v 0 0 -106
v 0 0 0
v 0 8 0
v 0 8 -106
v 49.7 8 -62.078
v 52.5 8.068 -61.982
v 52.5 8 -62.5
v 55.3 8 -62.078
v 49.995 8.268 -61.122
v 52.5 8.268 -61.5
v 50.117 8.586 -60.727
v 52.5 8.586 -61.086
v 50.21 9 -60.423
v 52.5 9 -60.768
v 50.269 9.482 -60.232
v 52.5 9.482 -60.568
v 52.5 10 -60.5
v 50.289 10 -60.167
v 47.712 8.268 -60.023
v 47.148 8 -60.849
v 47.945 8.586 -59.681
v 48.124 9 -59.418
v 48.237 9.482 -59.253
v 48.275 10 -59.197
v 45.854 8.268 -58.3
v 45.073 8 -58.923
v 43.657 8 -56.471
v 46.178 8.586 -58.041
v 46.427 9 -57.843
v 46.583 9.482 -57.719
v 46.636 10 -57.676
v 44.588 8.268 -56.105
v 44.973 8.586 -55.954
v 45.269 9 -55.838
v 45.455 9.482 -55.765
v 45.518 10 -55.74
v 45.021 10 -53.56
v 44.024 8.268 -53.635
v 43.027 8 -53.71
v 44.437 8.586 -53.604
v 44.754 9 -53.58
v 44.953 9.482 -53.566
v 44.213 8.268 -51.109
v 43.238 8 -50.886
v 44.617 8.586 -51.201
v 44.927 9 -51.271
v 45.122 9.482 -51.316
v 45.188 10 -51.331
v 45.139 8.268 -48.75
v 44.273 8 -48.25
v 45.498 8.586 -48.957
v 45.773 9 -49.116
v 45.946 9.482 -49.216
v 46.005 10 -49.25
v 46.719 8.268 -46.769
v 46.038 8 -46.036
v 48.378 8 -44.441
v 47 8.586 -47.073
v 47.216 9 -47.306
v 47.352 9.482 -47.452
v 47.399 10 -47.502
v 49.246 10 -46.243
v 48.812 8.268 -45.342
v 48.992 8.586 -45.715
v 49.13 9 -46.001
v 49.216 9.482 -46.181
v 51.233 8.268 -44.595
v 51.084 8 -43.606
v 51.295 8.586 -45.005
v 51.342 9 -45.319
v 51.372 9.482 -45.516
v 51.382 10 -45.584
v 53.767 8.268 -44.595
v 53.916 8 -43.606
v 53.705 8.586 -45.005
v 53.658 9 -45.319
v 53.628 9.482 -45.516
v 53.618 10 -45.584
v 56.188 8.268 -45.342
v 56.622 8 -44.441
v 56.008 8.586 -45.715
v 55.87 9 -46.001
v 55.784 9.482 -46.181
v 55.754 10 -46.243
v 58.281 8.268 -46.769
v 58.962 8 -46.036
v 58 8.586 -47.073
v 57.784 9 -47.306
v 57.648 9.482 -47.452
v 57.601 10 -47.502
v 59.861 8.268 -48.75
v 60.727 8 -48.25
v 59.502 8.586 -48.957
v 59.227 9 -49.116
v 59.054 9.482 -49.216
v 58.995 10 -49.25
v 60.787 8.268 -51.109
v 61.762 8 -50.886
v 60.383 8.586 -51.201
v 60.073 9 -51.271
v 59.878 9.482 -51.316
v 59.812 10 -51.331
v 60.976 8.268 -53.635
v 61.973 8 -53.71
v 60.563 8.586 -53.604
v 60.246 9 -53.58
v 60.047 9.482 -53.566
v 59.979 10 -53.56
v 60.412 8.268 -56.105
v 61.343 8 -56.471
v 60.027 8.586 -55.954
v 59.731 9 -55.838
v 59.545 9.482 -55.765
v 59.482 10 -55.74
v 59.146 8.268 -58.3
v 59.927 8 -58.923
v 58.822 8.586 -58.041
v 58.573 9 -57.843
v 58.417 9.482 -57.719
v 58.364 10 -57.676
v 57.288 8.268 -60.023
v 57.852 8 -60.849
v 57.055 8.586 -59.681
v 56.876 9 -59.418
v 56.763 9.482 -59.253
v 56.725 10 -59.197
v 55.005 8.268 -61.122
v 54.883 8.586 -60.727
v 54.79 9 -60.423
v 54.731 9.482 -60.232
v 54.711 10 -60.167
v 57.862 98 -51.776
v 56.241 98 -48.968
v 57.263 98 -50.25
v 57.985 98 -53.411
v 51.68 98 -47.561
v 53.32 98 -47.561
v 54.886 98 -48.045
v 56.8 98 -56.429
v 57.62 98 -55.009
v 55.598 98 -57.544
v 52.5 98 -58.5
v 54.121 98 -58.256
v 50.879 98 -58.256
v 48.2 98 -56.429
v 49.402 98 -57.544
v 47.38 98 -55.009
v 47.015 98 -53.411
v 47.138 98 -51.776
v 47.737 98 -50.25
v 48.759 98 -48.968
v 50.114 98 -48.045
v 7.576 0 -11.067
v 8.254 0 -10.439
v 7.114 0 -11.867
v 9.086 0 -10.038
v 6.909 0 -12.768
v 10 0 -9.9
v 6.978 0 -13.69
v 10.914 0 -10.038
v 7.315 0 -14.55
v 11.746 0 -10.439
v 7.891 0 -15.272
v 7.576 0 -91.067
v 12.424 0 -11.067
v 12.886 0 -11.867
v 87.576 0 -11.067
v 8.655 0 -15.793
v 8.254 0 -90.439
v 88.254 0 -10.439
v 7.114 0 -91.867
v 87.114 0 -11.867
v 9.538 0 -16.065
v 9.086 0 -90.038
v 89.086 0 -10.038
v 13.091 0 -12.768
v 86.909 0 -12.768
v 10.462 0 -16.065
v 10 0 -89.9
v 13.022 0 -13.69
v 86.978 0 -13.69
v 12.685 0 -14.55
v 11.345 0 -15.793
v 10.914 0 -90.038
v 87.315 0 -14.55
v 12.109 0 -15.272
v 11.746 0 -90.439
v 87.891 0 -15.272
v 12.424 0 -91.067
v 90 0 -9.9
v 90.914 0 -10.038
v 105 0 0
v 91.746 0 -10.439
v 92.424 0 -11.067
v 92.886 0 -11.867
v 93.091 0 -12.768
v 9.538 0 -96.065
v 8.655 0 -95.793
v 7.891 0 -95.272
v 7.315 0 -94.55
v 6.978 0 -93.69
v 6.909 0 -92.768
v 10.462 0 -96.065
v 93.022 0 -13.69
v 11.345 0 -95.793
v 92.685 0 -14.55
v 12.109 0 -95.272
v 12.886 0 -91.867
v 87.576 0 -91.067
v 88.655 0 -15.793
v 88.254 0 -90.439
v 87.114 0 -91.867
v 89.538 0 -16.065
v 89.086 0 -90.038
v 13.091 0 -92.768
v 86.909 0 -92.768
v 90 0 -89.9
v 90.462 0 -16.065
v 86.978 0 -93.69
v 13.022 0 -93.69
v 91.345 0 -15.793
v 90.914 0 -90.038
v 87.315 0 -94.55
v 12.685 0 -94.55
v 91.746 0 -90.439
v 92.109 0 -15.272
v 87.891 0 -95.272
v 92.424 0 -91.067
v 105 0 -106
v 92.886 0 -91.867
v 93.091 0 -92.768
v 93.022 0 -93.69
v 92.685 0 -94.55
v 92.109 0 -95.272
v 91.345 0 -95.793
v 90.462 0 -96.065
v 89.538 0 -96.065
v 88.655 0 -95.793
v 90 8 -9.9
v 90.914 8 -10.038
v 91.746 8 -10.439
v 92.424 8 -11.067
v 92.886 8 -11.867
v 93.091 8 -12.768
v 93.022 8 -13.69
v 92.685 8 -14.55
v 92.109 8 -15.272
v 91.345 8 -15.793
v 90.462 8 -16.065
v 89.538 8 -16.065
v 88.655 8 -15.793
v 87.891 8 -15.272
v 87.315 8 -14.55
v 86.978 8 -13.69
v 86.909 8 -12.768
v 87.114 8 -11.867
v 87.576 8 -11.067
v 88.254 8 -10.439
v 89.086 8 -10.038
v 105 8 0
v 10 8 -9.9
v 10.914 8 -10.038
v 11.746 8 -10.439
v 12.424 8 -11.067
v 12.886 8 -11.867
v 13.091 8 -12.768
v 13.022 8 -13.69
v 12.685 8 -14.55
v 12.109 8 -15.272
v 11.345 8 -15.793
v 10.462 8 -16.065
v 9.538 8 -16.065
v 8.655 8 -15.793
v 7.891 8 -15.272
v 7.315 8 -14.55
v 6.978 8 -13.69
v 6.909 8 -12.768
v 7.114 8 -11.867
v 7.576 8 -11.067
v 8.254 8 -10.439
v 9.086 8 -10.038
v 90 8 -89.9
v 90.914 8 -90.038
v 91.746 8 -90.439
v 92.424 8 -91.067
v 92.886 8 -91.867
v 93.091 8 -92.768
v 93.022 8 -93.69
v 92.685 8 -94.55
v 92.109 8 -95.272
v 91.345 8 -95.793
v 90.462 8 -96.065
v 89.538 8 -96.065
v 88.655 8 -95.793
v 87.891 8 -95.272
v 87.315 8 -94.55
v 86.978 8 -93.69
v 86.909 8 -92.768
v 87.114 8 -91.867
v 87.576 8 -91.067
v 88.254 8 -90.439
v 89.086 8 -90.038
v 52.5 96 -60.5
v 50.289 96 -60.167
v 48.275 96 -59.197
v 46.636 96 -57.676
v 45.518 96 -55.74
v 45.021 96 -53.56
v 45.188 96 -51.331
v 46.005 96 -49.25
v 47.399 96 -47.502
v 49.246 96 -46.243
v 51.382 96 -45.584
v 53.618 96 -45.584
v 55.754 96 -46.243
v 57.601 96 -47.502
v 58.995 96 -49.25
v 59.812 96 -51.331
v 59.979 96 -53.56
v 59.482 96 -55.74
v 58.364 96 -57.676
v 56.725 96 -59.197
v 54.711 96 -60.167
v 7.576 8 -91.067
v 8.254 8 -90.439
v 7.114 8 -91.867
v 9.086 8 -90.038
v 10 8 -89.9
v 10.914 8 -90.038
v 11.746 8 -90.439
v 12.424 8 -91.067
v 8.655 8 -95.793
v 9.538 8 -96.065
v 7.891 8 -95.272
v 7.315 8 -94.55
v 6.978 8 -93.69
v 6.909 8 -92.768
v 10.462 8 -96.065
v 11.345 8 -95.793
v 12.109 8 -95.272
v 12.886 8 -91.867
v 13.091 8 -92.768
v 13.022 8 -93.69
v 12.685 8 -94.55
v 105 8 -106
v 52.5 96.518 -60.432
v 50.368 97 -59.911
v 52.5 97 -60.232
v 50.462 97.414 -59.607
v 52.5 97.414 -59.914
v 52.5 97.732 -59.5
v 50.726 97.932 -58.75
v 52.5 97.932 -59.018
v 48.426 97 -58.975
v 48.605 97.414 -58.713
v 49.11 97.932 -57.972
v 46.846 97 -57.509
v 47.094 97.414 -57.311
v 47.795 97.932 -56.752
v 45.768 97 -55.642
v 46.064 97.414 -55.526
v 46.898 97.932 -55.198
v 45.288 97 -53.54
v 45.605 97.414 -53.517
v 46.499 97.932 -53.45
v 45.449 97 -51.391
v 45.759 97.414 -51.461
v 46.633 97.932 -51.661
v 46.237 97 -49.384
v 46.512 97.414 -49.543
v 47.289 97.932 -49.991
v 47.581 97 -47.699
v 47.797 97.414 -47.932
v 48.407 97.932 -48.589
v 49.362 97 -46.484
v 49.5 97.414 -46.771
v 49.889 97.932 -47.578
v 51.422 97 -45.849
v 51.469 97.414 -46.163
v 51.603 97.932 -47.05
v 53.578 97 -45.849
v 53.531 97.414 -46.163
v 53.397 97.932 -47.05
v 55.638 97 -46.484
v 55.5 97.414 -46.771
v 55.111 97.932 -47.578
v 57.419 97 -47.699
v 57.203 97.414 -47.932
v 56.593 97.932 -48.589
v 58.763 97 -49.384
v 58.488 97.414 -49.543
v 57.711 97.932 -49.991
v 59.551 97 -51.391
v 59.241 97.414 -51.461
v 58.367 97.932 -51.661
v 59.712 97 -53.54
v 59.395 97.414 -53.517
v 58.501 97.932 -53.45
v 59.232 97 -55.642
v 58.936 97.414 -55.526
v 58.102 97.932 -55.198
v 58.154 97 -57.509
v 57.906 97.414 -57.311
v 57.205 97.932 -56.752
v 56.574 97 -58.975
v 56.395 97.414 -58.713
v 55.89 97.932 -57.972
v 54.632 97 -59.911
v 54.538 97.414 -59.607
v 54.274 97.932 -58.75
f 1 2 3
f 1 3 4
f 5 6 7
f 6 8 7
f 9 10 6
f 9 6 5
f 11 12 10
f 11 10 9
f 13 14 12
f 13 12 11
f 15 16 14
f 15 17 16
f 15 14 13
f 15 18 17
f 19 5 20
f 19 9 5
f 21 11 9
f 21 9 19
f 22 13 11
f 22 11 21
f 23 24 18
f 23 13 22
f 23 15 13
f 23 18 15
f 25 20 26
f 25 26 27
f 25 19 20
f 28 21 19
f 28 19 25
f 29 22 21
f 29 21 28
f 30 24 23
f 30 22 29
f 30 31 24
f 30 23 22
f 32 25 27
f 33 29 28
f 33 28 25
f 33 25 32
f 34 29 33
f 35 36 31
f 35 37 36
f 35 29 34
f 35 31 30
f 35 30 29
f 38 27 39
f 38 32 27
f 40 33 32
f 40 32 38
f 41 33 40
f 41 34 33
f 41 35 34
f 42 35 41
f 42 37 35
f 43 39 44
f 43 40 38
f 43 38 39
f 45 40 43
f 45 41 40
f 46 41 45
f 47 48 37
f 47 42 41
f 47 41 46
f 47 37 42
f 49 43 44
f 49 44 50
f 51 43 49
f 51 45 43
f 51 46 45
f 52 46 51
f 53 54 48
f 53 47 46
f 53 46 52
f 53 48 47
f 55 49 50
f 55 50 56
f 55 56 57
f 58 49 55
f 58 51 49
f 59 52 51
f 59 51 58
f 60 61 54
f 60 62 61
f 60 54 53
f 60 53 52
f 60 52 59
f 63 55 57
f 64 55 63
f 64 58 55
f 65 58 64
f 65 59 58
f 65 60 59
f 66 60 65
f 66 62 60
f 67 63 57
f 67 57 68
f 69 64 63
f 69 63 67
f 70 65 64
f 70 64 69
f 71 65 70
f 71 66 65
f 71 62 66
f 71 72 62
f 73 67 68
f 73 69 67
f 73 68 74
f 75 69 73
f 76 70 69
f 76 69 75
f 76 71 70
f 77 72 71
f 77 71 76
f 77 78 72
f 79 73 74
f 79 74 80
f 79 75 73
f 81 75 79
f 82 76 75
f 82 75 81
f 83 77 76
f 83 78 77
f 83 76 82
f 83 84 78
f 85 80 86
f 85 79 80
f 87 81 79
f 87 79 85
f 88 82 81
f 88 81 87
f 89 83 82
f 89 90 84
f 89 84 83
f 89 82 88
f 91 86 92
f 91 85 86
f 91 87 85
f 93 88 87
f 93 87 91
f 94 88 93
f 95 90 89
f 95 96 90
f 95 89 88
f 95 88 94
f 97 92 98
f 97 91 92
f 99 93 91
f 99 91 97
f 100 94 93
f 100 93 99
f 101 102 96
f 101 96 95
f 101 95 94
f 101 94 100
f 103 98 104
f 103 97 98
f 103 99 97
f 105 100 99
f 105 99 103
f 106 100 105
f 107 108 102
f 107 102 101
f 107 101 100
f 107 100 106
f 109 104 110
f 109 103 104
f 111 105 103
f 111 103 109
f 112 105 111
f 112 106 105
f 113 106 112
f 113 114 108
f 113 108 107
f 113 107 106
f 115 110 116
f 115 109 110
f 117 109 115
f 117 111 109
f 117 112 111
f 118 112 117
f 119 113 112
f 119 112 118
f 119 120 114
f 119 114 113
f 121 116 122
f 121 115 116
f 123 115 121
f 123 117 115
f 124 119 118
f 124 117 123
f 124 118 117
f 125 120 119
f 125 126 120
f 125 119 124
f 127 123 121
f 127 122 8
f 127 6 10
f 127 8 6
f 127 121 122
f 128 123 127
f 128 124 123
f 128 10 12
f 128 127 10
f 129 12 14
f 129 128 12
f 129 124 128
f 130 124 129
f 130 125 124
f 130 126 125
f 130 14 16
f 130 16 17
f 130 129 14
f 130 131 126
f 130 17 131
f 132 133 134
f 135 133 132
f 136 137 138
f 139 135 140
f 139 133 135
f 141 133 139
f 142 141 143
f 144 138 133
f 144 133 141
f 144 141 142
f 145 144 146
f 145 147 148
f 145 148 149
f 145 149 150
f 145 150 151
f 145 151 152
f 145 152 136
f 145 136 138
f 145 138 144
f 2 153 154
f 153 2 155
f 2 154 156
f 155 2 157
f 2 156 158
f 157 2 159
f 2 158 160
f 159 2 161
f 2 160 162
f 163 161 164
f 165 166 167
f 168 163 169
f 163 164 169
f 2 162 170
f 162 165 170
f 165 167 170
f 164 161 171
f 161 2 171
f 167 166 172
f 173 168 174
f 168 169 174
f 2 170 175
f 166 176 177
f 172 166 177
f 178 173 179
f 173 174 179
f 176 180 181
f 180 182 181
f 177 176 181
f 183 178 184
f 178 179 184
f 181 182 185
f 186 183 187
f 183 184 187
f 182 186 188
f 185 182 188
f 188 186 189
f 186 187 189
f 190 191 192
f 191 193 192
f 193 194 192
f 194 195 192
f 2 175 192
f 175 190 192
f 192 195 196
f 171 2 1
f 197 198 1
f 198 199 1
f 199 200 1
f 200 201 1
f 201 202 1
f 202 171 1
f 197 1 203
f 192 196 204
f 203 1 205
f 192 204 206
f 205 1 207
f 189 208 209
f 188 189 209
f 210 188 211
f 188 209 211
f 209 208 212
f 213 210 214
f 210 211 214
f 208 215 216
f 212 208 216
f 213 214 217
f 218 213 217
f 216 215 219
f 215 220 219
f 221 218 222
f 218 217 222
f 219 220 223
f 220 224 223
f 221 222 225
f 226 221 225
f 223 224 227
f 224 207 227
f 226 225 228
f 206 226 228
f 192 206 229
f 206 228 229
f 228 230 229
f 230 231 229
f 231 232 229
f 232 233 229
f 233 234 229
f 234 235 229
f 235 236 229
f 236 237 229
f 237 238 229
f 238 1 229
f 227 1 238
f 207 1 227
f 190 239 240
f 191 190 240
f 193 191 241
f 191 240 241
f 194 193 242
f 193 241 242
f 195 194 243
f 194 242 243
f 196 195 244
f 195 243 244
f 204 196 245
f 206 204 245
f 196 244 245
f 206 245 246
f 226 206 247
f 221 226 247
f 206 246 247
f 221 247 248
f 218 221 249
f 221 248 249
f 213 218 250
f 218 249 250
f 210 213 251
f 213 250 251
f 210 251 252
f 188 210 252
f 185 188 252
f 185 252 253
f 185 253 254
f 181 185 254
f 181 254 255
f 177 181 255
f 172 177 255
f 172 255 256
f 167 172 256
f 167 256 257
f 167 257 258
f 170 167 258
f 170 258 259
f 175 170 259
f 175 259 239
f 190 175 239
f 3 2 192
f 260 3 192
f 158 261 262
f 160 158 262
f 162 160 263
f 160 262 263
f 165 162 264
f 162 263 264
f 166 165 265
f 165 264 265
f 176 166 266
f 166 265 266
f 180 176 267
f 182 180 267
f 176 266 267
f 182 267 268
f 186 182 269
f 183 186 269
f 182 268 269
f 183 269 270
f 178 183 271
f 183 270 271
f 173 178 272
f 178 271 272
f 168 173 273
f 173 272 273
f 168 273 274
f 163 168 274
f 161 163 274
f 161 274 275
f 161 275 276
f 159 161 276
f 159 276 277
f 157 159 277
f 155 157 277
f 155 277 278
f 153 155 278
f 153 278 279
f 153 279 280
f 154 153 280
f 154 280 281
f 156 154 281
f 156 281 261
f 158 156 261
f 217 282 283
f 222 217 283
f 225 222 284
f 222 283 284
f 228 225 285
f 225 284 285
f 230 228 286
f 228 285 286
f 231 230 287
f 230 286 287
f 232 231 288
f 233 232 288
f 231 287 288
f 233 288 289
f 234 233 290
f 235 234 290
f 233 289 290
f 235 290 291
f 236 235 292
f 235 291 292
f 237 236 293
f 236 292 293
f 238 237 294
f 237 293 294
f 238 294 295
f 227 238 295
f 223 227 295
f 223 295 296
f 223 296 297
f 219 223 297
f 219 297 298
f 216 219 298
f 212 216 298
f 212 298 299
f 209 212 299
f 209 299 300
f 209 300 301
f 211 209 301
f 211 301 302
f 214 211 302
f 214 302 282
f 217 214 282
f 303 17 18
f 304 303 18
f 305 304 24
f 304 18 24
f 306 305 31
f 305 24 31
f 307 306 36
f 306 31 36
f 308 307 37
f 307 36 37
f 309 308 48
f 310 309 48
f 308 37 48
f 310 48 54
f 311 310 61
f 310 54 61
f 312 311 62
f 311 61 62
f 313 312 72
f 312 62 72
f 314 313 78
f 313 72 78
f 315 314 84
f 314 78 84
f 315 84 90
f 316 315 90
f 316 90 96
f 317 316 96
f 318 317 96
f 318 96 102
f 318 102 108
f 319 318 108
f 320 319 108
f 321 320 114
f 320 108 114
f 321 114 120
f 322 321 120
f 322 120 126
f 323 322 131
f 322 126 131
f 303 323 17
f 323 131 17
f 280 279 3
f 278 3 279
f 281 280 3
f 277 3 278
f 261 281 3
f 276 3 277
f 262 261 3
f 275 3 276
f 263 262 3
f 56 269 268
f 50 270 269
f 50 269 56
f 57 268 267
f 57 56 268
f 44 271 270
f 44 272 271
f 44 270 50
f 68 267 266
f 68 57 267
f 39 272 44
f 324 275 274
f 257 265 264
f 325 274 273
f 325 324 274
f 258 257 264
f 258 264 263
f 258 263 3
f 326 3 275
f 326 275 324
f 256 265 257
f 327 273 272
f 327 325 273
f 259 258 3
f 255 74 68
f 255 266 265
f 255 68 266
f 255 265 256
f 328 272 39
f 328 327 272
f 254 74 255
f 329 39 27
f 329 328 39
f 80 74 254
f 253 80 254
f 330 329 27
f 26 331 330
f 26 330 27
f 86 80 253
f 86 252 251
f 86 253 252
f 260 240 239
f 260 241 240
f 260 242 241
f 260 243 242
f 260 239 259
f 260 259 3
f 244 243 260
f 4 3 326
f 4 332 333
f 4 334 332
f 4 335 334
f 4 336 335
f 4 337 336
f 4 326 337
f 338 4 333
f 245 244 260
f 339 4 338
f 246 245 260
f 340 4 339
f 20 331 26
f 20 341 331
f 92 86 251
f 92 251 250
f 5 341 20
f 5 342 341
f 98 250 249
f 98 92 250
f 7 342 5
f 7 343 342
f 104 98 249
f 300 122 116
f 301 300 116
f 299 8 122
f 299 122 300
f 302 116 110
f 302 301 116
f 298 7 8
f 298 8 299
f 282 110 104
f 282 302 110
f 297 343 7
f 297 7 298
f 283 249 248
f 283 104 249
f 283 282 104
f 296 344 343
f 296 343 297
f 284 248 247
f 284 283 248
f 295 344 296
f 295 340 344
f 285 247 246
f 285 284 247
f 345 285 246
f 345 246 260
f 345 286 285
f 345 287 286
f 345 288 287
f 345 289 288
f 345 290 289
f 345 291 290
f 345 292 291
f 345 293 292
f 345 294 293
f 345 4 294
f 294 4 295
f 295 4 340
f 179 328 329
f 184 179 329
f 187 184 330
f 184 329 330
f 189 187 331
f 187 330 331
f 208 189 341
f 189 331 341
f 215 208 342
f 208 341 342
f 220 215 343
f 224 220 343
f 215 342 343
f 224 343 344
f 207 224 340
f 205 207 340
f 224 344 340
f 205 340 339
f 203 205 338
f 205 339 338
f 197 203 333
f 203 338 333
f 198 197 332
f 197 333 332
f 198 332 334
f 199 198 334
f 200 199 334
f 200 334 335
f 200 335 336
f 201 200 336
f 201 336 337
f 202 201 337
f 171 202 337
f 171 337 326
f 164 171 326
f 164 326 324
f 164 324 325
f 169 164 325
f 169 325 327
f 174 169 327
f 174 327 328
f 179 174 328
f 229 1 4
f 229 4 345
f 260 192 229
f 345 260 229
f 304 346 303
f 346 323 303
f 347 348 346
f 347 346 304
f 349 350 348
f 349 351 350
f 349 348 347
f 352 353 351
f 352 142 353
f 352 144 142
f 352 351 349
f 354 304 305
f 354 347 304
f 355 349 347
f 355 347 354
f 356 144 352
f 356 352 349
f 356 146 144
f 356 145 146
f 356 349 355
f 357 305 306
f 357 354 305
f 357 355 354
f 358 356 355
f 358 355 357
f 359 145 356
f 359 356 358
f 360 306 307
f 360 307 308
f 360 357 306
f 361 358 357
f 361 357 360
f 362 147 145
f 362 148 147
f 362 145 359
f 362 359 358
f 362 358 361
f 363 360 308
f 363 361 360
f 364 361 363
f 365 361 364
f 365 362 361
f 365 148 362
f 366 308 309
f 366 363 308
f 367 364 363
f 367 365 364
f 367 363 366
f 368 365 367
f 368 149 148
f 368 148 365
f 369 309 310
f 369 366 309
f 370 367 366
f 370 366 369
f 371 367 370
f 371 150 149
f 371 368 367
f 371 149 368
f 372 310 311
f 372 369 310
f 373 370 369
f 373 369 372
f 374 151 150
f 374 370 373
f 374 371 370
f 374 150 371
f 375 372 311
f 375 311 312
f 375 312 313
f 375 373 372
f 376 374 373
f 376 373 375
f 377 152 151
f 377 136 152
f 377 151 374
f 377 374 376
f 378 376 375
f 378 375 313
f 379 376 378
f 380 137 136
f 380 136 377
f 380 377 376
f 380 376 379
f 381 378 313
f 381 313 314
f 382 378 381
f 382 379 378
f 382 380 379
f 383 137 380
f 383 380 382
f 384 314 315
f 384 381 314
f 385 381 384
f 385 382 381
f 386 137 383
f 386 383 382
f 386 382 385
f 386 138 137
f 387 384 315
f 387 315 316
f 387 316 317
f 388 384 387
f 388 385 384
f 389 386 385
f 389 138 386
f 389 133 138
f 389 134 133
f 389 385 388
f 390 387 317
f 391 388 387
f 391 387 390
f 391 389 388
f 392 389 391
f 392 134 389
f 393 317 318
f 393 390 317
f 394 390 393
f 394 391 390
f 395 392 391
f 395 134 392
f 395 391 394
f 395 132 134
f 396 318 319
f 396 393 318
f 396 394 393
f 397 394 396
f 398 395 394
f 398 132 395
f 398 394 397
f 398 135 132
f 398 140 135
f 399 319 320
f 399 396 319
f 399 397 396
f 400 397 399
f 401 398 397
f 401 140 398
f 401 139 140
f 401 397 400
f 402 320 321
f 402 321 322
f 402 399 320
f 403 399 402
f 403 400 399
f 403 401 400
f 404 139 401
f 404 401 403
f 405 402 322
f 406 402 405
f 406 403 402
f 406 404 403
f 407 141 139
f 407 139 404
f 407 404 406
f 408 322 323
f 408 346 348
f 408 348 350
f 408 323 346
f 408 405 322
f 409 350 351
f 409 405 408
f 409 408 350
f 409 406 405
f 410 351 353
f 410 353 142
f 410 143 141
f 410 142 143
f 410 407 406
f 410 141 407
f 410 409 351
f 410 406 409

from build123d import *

# Parameters (mm, degrees)
SKETCH_1_W          = 105
SKETCH_1_H          = 106
EXTRUDE_1_DEPTH     = 8
SKETCH_3_R          = 3.1
CUT_EXTRUDE_1_DEPTH = 10
SKETCH_5_R          = 7.5
EXTRUDE_2_DEPTH     = 90
FILLET_1_R          = 2


with BuildPart() as part:
    # 草图1 → 凸台-拉伸1 (new body)
    with BuildSketch(Plane(origin=(0, 0, 0), x_dir=(1, 0, 0), z_dir=(0, 1, 0))):
        with Locations((52.5, 53)):
            Rectangle(SKETCH_1_W, SKETCH_1_H)
    extrude(amount=EXTRUDE_1_DEPTH)

    # 草图3 → 切除-拉伸1 (cut)
    with BuildSketch(Plane(origin=(0, 8, 0), x_dir=(1, 0, 0), z_dir=(0, 1, 0))):
        with Locations(Location((90, 13, 0), (0, 0, 270))):
            Circle(SKETCH_3_R)
        with Locations(Location((90, 93, 0), (0, 0, 270))):
            Circle(SKETCH_3_R)
        with Locations(Location((10, 93, 0), (0, 0, 270))):
            Circle(SKETCH_3_R)
        with Locations(Location((10, 13, 0), (0, 0, 270))):
            Circle(SKETCH_3_R)
    extrude(amount=-CUT_EXTRUDE_1_DEPTH, mode=Mode.SUBTRACT)

    # 草图5 → 凸台-拉伸2 (add)
    with BuildSketch(Plane(origin=(0, 8, 0), x_dir=(1, 0, 0), z_dir=(0, 1, 0))):
        with Locations(Location((52.5, 53, 0), (0, 0, 90))):
            Circle(SKETCH_5_R)
    extrude(amount=EXTRUDE_2_DEPTH)

    # 圆角1
    fillet_1_edges = [part.edges().sort_by_distance(p)[0] for p in [
        (52.5, 8, -45.5),
        (52.5, 98, -45.5),
    ]]
    fillet(fillet_1_edges, radius=FILLET_1_R)


solid = part.part
